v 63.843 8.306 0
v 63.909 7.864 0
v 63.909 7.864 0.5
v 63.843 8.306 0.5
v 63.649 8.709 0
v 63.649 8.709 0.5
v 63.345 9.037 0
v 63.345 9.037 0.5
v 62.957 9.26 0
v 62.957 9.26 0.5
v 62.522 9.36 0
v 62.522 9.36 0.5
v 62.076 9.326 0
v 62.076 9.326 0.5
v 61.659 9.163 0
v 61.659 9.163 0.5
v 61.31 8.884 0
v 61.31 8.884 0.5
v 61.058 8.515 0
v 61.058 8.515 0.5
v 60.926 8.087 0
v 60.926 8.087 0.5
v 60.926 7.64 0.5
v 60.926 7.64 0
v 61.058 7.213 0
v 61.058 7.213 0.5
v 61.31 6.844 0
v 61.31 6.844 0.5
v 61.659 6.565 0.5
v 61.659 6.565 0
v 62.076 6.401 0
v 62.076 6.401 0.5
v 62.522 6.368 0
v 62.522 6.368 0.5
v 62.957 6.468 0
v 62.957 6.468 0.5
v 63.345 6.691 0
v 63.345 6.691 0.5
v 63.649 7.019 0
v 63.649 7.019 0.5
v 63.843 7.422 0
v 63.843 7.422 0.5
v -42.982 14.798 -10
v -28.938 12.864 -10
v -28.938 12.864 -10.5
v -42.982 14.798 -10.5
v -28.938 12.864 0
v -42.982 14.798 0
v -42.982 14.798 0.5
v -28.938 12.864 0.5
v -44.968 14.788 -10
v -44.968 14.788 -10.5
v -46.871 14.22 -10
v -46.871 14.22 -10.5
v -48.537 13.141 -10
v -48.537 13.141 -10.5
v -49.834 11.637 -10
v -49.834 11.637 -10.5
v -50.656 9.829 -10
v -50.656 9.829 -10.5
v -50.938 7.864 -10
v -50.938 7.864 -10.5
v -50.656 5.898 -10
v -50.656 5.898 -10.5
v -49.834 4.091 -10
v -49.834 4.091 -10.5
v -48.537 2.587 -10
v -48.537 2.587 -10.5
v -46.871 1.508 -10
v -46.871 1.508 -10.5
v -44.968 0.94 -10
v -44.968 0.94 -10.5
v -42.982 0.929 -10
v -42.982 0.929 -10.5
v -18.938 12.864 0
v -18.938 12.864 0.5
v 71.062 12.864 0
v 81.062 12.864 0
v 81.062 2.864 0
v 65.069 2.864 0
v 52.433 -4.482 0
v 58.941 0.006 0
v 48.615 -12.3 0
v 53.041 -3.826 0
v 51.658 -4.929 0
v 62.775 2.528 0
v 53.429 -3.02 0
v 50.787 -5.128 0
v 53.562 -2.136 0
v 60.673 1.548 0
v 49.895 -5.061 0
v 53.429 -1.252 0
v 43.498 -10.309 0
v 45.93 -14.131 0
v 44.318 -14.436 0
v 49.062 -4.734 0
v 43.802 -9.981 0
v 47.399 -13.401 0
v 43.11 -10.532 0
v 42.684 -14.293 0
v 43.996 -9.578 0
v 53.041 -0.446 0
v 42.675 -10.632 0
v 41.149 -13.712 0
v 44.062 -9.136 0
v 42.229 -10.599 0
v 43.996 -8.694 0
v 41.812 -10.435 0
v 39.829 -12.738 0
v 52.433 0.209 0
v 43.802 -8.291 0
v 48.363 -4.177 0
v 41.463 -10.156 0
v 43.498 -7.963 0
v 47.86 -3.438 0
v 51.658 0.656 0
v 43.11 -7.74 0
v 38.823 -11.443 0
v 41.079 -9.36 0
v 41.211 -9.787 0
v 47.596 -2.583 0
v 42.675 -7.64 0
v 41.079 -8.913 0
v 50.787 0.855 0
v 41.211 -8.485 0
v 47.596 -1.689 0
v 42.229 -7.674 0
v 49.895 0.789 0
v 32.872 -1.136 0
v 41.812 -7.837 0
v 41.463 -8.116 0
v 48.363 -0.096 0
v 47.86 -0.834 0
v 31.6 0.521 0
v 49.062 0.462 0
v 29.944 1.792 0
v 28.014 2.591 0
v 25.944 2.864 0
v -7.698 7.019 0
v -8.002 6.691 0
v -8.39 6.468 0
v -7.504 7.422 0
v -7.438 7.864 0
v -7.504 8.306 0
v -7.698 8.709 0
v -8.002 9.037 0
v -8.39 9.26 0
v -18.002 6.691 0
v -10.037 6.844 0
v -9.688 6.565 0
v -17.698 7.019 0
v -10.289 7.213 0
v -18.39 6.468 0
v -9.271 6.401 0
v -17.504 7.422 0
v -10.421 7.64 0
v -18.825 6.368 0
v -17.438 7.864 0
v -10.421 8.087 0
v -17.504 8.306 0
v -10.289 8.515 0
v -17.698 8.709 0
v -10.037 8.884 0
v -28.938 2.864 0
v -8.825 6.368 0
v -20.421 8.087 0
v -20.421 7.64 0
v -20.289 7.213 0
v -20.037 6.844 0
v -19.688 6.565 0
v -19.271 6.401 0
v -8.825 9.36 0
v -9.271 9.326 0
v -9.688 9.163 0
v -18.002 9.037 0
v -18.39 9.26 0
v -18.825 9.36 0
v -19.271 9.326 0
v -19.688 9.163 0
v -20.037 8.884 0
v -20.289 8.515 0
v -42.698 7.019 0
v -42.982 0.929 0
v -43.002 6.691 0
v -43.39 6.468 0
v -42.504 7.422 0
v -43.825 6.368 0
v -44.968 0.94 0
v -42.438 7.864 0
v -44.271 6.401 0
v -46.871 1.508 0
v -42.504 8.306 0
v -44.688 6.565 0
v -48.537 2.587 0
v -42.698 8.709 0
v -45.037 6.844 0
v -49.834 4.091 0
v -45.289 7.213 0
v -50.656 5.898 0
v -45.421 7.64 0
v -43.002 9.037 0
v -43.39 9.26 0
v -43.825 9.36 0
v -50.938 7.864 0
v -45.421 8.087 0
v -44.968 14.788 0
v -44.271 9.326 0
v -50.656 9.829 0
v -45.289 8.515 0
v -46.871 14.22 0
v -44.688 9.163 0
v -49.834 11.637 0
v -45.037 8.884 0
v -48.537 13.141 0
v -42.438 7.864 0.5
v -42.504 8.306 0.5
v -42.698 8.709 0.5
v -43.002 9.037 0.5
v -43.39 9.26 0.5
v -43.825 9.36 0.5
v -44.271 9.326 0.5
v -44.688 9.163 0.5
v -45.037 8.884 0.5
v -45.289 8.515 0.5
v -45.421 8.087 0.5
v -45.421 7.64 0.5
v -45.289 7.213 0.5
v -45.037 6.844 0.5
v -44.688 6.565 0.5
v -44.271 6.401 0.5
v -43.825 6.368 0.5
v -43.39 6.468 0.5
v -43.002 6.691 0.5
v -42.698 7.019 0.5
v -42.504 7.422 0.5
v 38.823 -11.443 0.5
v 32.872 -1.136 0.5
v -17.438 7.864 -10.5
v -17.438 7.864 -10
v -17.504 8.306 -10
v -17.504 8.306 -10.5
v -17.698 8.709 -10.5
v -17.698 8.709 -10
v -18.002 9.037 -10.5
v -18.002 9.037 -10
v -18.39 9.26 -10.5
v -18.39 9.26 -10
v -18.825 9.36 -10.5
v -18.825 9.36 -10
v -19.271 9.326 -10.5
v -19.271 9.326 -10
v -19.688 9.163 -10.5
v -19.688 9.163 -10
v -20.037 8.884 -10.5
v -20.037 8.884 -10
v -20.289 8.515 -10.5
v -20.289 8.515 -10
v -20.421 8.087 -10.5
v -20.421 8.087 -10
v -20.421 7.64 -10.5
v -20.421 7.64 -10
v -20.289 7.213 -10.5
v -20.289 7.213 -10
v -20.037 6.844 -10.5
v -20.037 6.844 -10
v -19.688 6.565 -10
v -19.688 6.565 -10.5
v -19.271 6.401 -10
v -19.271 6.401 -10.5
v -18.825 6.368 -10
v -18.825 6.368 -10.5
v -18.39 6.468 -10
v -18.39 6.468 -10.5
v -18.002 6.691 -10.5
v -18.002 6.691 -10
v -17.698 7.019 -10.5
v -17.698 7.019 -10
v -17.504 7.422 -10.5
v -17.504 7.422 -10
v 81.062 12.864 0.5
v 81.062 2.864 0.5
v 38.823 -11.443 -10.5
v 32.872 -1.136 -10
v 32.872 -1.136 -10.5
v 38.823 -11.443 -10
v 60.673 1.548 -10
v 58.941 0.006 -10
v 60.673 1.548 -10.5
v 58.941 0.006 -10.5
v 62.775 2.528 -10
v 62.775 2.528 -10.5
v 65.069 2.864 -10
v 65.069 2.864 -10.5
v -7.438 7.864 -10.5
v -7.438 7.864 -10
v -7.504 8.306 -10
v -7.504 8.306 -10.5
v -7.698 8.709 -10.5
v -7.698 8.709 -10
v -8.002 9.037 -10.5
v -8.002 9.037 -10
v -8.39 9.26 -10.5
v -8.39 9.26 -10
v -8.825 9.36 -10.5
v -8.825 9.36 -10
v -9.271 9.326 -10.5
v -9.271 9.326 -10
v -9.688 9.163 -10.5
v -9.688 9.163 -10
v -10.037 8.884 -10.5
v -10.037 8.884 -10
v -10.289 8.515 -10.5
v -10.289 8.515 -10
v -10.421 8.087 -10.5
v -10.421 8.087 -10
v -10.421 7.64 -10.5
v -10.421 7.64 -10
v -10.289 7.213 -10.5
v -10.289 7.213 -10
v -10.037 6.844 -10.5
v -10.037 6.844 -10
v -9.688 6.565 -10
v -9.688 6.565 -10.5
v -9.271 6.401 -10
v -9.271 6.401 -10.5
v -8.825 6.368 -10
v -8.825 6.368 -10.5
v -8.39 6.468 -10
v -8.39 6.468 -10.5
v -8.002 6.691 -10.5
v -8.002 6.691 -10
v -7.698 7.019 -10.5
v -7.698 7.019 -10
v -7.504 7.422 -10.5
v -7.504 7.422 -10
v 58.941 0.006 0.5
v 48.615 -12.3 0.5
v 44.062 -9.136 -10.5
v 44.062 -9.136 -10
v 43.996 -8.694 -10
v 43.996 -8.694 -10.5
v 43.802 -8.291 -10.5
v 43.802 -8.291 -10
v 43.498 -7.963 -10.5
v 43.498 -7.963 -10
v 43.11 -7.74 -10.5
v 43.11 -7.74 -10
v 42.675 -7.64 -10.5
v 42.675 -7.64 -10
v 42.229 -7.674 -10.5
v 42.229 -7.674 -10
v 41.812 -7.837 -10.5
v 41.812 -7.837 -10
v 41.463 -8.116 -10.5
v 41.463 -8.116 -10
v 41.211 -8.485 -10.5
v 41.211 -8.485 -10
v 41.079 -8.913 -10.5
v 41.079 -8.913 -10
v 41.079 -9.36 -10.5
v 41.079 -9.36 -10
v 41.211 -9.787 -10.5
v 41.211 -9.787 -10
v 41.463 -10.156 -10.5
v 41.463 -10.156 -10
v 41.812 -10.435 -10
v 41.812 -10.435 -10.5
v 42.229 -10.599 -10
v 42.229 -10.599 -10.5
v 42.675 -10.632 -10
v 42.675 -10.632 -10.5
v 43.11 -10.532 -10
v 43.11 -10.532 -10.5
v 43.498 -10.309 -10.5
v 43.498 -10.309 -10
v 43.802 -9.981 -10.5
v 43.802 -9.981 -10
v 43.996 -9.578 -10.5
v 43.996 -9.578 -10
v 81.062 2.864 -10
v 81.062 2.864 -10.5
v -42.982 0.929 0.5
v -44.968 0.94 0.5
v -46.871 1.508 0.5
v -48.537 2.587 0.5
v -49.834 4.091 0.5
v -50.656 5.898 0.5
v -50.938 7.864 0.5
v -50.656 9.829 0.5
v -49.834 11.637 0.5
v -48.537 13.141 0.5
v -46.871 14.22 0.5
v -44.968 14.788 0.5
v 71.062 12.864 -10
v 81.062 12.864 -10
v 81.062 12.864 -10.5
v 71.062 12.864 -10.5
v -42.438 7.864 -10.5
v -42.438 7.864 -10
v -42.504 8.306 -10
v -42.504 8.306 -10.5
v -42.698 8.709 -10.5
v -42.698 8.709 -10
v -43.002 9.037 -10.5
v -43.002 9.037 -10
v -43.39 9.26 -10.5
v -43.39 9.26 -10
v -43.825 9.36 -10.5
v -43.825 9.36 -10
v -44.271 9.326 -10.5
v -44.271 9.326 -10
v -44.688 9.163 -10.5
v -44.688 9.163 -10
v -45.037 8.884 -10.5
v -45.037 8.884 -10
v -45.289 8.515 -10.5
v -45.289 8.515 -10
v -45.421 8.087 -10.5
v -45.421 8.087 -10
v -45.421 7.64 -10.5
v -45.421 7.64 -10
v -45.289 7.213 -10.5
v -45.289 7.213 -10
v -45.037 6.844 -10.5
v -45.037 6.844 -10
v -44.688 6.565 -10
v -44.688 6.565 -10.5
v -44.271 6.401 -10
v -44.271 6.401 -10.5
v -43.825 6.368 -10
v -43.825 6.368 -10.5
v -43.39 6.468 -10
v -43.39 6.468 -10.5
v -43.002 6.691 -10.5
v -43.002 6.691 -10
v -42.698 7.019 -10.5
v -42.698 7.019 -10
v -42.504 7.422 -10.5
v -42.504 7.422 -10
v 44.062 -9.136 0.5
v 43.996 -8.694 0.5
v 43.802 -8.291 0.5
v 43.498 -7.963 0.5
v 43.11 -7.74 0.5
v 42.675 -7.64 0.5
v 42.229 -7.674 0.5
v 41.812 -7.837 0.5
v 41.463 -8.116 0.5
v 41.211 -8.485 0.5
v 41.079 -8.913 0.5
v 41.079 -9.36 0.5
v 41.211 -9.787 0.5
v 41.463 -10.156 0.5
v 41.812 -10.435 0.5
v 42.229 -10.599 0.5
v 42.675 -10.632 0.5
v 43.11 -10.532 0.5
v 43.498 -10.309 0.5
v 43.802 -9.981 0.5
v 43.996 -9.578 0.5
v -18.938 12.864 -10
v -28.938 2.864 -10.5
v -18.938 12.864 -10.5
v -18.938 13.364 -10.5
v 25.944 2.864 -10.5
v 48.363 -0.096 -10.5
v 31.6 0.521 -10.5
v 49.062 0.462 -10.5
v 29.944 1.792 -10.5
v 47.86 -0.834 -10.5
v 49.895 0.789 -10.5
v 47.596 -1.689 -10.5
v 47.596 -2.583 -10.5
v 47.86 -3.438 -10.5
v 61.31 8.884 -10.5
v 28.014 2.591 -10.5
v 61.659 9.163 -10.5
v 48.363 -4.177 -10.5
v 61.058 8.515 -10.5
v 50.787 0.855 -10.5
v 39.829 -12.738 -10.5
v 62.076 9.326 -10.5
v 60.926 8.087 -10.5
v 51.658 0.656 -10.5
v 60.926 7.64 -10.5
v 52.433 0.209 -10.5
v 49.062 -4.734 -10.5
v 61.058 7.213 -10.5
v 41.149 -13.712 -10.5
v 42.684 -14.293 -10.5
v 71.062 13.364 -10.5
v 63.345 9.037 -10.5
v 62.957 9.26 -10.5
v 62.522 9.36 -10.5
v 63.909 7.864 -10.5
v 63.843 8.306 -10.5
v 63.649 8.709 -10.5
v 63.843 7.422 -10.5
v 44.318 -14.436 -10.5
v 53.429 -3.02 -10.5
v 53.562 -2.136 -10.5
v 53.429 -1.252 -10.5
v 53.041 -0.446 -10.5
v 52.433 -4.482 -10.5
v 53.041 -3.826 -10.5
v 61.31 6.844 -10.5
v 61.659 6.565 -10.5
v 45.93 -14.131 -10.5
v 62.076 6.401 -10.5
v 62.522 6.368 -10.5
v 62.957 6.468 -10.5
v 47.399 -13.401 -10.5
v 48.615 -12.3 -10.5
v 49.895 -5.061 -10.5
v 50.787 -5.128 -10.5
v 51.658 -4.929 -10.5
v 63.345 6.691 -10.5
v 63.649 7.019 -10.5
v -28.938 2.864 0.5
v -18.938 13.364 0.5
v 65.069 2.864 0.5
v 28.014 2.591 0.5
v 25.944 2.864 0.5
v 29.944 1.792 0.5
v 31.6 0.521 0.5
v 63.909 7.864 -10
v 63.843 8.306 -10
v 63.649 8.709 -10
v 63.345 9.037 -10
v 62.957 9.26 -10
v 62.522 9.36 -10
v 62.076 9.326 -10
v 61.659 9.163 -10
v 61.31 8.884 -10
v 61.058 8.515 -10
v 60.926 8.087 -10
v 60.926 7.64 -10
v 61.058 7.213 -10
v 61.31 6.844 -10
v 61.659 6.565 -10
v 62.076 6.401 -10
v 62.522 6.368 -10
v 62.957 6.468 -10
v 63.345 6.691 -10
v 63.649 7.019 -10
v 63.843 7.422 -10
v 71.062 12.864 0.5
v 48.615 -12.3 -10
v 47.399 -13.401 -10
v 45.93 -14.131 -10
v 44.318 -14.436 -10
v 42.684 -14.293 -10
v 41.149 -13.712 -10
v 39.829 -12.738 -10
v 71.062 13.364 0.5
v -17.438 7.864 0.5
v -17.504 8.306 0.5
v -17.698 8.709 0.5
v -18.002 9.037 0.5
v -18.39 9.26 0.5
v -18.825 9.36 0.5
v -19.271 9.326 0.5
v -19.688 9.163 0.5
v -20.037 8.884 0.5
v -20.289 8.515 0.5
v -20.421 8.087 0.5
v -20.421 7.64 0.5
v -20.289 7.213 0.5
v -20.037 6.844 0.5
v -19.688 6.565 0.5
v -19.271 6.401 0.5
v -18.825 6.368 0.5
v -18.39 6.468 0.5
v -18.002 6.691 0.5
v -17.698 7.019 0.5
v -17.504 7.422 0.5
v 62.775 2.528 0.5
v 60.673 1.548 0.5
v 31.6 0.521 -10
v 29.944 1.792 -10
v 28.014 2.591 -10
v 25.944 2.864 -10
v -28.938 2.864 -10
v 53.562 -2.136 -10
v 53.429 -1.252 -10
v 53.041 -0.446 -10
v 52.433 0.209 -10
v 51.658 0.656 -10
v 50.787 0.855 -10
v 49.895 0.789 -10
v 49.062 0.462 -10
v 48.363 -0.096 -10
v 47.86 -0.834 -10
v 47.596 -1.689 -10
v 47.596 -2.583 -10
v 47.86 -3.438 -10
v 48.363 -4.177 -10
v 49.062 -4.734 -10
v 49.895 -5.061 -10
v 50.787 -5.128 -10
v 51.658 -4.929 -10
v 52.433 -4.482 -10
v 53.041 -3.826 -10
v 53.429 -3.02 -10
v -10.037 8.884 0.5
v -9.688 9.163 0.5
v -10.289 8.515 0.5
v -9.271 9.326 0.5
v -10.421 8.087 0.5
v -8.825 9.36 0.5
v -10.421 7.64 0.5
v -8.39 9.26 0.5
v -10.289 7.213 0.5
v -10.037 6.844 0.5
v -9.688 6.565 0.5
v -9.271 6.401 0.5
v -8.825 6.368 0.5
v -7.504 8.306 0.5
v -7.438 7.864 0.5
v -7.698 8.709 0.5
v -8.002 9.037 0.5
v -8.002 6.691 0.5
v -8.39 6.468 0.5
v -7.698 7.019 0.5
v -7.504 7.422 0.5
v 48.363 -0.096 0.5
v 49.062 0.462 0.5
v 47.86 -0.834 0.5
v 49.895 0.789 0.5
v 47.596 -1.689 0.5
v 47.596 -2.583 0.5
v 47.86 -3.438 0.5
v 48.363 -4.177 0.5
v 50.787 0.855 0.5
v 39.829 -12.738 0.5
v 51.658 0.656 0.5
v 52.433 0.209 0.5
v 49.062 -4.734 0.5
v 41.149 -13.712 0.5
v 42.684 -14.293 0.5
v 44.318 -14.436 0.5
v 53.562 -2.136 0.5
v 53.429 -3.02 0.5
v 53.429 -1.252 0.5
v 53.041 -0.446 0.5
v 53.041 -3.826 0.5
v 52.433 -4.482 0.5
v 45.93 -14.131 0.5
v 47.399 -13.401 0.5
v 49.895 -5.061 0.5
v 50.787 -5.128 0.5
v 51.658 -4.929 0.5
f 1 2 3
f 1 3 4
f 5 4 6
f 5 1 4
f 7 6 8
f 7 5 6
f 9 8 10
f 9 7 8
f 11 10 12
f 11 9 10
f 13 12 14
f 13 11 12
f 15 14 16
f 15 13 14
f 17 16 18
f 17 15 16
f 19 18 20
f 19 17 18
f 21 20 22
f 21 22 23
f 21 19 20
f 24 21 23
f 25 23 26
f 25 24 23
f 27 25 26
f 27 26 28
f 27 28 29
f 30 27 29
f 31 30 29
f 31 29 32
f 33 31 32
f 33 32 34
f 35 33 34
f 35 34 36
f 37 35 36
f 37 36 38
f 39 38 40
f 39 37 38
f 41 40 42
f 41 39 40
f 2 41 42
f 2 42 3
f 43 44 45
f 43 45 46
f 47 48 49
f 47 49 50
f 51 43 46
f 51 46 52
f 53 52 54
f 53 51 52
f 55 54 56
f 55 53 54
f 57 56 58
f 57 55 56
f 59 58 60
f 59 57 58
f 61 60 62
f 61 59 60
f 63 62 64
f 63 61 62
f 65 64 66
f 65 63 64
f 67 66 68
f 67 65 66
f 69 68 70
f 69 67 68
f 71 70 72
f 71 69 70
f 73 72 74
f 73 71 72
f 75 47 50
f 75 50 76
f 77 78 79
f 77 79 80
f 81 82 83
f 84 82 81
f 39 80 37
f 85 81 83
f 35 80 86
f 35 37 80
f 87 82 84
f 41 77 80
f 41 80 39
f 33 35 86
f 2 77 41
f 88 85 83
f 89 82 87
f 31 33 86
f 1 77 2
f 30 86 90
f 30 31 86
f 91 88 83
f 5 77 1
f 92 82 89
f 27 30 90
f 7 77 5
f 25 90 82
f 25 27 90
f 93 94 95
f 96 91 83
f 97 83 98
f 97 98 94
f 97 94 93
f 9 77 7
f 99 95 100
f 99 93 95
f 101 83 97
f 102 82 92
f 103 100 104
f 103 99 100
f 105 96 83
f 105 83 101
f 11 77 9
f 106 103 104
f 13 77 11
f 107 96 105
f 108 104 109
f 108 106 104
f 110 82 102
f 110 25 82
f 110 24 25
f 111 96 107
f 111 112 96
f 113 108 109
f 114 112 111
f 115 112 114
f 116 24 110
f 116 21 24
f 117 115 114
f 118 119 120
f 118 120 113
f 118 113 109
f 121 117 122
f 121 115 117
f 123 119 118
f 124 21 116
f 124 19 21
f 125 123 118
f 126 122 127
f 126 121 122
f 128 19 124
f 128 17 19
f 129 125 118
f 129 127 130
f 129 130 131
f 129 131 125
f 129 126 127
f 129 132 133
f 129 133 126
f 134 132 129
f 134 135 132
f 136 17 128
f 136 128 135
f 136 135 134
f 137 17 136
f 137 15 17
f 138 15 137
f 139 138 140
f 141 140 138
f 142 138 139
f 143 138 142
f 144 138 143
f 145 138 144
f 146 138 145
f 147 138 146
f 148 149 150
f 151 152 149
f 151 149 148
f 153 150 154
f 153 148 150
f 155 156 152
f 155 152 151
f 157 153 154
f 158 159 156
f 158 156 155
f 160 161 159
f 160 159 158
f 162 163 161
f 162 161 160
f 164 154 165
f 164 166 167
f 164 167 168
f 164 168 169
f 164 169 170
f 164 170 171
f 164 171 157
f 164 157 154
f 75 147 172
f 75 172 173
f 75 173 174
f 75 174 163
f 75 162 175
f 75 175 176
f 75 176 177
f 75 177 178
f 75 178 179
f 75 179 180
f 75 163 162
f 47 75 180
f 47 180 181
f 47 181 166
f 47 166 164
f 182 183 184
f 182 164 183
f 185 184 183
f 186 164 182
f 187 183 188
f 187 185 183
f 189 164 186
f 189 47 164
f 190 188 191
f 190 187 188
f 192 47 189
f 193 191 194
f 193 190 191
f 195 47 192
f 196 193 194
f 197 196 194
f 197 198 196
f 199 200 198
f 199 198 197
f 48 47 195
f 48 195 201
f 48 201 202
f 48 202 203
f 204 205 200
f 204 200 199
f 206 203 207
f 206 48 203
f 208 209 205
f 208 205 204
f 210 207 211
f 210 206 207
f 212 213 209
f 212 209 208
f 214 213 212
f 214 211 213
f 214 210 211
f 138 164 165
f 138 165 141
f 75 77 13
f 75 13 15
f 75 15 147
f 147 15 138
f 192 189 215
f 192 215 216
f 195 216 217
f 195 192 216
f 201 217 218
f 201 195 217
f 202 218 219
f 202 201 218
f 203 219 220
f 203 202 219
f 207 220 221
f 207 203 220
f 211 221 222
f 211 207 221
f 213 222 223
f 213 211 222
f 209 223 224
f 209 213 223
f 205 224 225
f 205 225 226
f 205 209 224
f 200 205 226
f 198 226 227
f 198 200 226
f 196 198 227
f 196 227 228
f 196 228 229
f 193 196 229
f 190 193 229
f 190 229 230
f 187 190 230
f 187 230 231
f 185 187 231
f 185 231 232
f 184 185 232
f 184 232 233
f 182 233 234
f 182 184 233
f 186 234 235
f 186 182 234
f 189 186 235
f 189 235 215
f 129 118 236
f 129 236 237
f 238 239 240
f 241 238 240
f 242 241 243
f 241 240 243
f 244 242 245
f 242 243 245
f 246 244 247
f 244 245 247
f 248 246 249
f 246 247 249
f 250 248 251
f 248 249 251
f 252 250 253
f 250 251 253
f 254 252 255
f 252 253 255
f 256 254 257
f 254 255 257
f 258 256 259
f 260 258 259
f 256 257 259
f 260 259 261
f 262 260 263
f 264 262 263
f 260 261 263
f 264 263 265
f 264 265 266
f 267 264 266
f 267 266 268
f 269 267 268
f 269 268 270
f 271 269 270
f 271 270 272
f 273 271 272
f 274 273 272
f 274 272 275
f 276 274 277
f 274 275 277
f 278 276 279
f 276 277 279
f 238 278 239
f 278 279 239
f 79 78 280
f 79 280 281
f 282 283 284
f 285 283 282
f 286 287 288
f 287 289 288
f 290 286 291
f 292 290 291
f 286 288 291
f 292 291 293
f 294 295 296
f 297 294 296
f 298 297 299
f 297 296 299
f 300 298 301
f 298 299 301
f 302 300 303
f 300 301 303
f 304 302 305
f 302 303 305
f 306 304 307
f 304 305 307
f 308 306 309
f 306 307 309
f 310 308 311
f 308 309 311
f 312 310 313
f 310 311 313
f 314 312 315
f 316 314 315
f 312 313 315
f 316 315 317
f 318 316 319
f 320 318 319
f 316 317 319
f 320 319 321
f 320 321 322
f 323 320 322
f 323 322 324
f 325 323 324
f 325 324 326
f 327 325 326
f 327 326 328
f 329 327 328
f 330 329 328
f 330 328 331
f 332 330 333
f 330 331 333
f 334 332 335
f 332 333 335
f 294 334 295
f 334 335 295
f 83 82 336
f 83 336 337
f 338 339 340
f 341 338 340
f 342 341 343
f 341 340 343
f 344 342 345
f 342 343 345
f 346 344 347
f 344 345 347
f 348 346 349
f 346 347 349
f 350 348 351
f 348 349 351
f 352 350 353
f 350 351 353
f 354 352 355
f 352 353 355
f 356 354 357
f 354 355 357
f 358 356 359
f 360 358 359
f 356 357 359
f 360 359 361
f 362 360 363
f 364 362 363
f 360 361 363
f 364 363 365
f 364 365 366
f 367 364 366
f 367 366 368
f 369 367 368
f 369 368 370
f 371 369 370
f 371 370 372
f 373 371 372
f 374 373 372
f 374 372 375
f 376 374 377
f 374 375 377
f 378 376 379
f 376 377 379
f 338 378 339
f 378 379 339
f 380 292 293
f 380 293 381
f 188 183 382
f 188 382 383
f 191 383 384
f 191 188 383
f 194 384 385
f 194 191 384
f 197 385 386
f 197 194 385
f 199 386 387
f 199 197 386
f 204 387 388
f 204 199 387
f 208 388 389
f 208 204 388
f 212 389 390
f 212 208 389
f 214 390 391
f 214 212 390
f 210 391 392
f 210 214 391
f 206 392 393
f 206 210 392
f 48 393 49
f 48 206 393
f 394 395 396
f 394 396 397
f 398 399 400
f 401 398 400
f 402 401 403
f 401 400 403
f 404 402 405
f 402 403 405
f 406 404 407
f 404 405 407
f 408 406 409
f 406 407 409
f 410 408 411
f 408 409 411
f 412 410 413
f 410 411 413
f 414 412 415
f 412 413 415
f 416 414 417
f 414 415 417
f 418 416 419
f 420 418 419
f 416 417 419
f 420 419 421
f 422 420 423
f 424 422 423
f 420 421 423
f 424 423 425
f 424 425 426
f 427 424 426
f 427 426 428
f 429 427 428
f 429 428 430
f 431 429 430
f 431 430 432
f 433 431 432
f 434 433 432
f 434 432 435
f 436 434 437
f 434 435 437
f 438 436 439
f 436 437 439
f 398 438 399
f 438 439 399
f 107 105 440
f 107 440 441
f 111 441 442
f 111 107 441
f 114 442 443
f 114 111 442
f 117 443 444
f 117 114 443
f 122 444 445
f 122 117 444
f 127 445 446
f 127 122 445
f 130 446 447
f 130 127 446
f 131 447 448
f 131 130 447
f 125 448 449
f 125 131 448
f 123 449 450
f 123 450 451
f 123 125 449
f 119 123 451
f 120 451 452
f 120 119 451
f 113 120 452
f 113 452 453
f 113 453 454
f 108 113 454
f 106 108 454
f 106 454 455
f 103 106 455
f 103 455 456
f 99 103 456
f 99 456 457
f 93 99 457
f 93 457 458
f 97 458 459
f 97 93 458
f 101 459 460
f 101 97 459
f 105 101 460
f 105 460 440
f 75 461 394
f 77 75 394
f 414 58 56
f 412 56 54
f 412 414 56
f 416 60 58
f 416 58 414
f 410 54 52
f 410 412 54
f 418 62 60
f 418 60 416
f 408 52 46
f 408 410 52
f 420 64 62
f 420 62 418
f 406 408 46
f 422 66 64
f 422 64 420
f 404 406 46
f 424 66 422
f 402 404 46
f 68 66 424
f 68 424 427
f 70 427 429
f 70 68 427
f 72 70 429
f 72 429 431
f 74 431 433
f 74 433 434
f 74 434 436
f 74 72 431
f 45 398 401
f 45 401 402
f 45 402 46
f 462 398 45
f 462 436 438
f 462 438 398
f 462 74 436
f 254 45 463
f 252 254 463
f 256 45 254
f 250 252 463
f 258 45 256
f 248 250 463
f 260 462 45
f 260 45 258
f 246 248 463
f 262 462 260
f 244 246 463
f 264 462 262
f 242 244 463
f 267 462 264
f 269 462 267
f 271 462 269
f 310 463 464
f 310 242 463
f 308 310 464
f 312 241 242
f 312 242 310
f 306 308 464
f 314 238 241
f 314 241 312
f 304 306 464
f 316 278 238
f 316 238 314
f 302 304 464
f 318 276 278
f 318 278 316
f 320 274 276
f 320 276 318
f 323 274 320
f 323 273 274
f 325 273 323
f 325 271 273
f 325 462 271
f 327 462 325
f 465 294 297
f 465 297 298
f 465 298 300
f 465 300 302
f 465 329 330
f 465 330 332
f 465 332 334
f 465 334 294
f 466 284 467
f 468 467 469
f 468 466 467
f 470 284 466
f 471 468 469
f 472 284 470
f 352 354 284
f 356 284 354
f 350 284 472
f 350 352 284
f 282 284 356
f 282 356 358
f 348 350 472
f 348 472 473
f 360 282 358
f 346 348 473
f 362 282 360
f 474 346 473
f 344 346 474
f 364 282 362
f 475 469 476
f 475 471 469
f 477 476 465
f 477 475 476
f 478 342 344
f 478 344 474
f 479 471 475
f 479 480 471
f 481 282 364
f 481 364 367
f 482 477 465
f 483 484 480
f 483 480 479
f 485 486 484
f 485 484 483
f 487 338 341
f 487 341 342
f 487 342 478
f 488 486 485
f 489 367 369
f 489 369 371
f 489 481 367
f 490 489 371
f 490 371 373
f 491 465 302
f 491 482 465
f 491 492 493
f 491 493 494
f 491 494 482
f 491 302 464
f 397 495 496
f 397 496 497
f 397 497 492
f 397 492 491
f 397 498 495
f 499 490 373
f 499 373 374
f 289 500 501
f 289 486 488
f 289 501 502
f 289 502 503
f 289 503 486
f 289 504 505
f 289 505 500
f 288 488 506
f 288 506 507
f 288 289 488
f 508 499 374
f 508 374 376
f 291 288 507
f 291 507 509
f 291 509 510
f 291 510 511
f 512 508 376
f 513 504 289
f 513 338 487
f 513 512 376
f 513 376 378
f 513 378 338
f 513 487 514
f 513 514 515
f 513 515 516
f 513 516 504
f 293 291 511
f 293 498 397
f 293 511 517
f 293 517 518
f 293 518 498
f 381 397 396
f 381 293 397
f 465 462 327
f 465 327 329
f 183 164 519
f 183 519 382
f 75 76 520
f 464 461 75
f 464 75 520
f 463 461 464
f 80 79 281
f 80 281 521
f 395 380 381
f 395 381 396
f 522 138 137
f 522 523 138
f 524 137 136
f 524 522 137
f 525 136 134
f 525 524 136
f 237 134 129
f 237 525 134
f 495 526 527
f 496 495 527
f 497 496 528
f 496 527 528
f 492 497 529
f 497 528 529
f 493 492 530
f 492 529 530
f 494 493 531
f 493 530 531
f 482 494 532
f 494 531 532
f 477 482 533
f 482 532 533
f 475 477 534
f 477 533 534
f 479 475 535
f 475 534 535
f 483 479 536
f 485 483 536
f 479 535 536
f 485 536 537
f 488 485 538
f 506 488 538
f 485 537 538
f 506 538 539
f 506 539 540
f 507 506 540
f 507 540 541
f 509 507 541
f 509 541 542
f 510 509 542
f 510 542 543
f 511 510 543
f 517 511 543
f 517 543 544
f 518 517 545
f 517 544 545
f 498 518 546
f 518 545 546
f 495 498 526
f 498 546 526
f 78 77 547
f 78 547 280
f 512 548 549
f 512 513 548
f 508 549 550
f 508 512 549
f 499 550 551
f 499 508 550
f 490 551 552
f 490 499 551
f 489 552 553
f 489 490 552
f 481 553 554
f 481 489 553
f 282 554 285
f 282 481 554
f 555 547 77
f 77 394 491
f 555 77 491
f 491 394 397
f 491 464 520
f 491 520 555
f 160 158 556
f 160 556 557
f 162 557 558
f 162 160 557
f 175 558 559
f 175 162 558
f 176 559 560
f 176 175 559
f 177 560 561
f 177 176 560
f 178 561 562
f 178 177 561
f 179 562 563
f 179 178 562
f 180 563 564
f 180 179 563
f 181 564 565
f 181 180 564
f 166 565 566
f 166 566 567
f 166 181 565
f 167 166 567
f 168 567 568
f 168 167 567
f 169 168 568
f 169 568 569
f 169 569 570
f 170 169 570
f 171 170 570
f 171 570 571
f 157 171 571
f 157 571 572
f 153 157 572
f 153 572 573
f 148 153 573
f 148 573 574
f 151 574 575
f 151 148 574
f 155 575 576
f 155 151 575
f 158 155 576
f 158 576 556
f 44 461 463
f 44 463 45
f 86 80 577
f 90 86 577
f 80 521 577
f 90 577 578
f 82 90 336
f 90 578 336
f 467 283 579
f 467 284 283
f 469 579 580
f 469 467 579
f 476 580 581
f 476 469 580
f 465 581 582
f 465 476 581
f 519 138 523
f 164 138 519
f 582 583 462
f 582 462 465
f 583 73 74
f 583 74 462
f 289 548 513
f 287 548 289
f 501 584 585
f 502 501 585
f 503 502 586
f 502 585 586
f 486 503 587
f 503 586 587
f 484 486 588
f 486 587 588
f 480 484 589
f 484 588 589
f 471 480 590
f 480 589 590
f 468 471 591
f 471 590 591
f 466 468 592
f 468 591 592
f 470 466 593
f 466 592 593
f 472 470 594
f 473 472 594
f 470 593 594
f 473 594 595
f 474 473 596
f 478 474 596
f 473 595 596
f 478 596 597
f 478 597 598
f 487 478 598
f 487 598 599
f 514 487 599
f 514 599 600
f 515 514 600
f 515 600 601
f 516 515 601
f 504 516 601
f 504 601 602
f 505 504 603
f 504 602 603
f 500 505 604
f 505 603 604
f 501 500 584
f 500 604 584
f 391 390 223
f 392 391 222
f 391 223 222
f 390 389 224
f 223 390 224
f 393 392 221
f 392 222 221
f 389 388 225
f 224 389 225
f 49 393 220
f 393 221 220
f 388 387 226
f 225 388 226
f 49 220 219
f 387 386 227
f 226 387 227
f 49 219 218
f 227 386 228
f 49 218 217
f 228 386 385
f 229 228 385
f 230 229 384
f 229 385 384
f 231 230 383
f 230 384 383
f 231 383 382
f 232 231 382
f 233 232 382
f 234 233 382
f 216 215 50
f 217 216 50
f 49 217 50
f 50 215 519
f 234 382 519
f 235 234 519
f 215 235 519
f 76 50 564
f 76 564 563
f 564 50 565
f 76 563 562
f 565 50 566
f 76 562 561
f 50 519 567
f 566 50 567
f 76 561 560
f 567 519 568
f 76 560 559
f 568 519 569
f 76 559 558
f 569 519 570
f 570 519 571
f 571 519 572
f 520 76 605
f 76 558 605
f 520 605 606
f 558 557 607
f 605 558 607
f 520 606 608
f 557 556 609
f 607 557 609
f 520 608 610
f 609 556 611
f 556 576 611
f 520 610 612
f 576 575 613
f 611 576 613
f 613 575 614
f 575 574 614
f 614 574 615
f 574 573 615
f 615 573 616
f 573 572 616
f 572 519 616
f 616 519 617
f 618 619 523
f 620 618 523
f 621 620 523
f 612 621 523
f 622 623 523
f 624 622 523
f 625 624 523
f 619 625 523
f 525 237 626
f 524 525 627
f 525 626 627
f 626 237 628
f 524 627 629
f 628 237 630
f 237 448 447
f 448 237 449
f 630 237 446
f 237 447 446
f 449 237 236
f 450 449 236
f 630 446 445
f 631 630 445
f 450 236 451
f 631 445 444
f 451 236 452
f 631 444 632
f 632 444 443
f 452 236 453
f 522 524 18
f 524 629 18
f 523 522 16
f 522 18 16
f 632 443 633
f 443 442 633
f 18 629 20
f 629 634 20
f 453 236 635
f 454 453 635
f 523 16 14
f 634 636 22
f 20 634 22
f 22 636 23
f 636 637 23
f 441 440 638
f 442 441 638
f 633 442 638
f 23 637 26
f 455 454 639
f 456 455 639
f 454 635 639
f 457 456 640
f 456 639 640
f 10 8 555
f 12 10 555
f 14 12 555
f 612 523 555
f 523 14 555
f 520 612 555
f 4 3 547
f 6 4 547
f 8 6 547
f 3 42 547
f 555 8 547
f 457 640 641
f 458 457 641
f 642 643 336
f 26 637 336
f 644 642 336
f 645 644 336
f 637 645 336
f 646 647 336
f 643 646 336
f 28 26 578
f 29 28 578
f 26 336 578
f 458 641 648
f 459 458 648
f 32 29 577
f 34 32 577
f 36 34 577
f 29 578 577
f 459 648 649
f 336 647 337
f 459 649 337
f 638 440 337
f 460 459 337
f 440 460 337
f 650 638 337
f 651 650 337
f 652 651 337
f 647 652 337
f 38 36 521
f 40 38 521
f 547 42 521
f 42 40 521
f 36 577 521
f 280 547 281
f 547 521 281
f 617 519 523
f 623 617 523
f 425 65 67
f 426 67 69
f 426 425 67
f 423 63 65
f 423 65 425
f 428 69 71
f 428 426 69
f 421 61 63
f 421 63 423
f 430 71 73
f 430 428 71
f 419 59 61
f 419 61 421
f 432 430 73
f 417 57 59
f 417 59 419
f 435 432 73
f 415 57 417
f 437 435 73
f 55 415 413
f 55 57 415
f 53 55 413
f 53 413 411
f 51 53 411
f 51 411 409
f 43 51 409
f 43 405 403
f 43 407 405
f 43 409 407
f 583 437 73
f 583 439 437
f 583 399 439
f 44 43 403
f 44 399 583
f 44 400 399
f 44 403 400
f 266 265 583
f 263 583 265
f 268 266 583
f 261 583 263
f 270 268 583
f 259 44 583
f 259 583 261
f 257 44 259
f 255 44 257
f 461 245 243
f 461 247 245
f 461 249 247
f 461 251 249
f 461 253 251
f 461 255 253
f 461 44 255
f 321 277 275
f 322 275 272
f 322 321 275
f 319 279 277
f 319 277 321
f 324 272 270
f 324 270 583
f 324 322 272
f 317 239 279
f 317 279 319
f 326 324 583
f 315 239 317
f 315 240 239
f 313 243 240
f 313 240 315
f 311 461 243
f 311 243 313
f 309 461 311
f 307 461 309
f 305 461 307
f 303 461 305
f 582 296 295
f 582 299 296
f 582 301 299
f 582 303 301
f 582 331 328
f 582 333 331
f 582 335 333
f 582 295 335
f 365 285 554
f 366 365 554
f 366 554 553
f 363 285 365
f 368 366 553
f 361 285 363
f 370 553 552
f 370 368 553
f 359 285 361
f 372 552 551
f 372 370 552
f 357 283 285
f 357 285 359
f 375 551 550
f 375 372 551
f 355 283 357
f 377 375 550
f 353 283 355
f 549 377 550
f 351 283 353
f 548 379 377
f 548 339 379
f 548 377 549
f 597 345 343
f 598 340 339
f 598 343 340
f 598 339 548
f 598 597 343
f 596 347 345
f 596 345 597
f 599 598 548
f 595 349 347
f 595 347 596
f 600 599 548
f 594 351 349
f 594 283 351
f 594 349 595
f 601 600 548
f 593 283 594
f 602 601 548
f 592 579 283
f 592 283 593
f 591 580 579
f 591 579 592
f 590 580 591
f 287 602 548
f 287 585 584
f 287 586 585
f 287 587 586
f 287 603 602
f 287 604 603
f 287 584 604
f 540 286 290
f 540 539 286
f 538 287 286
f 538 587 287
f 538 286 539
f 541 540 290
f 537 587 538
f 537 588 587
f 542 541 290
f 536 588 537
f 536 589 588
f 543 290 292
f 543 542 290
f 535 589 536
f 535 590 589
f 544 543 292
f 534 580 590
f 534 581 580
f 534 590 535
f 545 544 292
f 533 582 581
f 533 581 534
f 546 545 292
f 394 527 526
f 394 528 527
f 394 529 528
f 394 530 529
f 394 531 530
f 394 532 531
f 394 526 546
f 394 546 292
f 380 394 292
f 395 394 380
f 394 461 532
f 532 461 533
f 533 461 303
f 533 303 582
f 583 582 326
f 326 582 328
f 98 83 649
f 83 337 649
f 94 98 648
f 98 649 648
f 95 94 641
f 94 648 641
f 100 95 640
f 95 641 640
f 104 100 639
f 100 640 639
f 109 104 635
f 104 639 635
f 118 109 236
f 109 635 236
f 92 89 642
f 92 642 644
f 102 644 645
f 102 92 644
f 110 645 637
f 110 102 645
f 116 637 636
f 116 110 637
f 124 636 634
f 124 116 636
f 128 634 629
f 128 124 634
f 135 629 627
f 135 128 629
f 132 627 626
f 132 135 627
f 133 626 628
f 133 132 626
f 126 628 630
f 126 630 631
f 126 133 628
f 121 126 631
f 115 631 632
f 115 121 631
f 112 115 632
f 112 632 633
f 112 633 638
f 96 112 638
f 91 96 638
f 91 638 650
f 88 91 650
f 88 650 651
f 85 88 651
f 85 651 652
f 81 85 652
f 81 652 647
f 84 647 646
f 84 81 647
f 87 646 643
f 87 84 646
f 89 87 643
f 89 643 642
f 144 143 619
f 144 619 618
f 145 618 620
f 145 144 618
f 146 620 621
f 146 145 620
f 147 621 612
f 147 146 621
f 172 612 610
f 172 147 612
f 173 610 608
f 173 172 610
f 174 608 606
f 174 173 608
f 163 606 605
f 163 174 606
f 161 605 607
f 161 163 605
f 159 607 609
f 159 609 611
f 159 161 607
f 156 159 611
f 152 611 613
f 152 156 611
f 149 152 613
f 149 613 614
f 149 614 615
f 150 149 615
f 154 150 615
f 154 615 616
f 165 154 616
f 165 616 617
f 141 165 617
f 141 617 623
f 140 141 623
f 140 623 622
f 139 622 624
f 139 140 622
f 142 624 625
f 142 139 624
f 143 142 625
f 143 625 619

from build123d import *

# Parameters (mm, degrees)
SKETCH_1_R      = 1.5
SKETCH_1_R_2    = 3
EXTRUDE_1_DEPTH = 0.5
SKETCH_3_R      = 3
SKETCH_3_R_2    = 1.5
EXTRUDE_2_DEPTH = 0.5
SKETCH_4_W      = 90
SKETCH_4_H      = 11
EXTRUDE_3_DEPTH = 0.5
FILLET_1_R      = 8
FILLET_2_R      = 6


with BuildPart() as part:
    # 草图1 → 凸台-拉伸1 (new body)
    with BuildSketch(Plane.XY):
        with BuildLine():
            Line((-28.937588447, 12.863865809), (81.062411553, 12.863865809))
            Line((81.062411553, 12.863865809), (81.062411553, 2.863865809))
            Line((81.062411553, 2.863865809), (61.338833841, 2.863865809))
            Line((61.338833841, 2.863865809), (43.106996214, -18.863992184))
            Line((43.106996214, -18.863992184), (30.562411553, 2.863865809))
            Line((30.562411553, 2.863865809), (-28.937588447, 2.863865809))
            Line((-28.937588447, 2.863865809), (-42.98243101, 0.92933812))
            ThreePointArc((-42.98243101, 0.92933812), (-50.937588447, 7.863865809), (-42.98243101, 14.798393498))
            Line((-42.98243101, 14.798393498), (-28.937588447, 12.863865809))
        make_face()
        with Locations((-43.937588447, 7.863865809)):
            Circle(SKETCH_1_R, mode=Mode.SUBTRACT)
        with Locations((42.562411553, -9.136134191)):
            Circle(SKETCH_1_R, mode=Mode.SUBTRACT)
        with Locations((50.562411553, -2.136134191)):
            Circle(SKETCH_1_R_2, mode=Mode.SUBTRACT)
        with Locations((-18.937588447, 7.863865809)):
            Circle(SKETCH_1_R, mode=Mode.SUBTRACT)
        with Locations((-8.937588447, 7.863865809)):
            Circle(SKETCH_1_R, mode=Mode.SUBTRACT)
        with Locations((62.409410938, 7.863865809)):
            Circle(SKETCH_1_R, mode=Mode.SUBTRACT)
    extrude(amount=EXTRUDE_1_DEPTH)



with BuildPart() as body_2:
    # 草图3 → 凸台-拉伸2 (new body)
    with BuildSketch(Plane.XY.offset(-10)):
        with BuildLine():
            Line((43.106996214, -18.863992184), (61.338833841, 2.863865809))
            Line((61.338833841, 2.863865809), (81.062411553, 2.863865809))
            Line((81.062411553, 2.863865809), (81.062411553, 12.863865809))
            Line((81.062411553, 12.863865809), (-28.937588447, 12.863865809))
            Line((-28.937588447, 12.863865809), (-42.98243101, 14.798393498))
            ThreePointArc((-42.98243101, 14.798393498), (-50.937588447, 7.863865809), (-42.98243101, 0.92933812))
            Line((-42.98243101, 0.92933812), (-28.937588447, 2.863865809))
            Line((-28.937588447, 2.863865809), (30.562411553, 2.863865809))
            Line((30.562411553, 2.863865809), (43.106996214, -18.863992184))
        make_face()
        with Locations((50.562411553, -2.136134191)):
            Circle(SKETCH_3_R, mode=Mode.SUBTRACT)
        with Locations((42.562411553, -9.136134191)):
            Circle(SKETCH_3_R_2, mode=Mode.SUBTRACT)
        with Locations((-43.937588447, 7.863865809)):
            Circle(SKETCH_3_R_2, mode=Mode.SUBTRACT)
        with Locations((62.409410938, 7.863865809)):
            Circle(SKETCH_3_R_2, mode=Mode.SUBTRACT)
        with Locations((-8.937588447, 7.863865809)):
            Circle(SKETCH_3_R_2, mode=Mode.SUBTRACT)
        with Locations((-18.937588447, 7.863865809)):
            Circle(SKETCH_3_R_2, mode=Mode.SUBTRACT)
    extrude(amount=-EXTRUDE_2_DEPTH)


with BuildPart() as part_1:
    add(part.part)

    add(body_2.part)  # 凸台-拉伸3 merges body 2
    # 草图4 → 凸台-拉伸3 (add)
    with BuildSketch(Plane(origin=(0, 12.863865809, 0), x_dir=(1, 0, 0), z_dir=(0, 1, 0))):
        with Locations((26.062411553, 5)):
            Rectangle(SKETCH_4_W, SKETCH_4_H)
    extrude(amount=EXTRUDE_3_DEPTH)

    # 圆角1
    fillet_1_edges = [part_1.edges().sort_by_distance(p)[0] for p in [
        (61.338833841, 2.863865809, 0.25),
        (30.562411553, 2.863865809, 0.25),
        (30.562411553, 2.863865809, -10.25),
        (61.338833841, 2.863865809, -10.25),
    ]]
    fillet(fillet_1_edges, radius=FILLET_1_R)

    # 圆角2
    fillet_2_edges = [part_1.edges().sort_by_distance(p)[0] for p in [
        (43.106996214, -18.863992184, 0.25),
        (43.106996214, -18.863992184, -10.25),
    ]]
    fillet(fillet_2_edges, radius=FILLET_2_R)


solid = part_1.part
